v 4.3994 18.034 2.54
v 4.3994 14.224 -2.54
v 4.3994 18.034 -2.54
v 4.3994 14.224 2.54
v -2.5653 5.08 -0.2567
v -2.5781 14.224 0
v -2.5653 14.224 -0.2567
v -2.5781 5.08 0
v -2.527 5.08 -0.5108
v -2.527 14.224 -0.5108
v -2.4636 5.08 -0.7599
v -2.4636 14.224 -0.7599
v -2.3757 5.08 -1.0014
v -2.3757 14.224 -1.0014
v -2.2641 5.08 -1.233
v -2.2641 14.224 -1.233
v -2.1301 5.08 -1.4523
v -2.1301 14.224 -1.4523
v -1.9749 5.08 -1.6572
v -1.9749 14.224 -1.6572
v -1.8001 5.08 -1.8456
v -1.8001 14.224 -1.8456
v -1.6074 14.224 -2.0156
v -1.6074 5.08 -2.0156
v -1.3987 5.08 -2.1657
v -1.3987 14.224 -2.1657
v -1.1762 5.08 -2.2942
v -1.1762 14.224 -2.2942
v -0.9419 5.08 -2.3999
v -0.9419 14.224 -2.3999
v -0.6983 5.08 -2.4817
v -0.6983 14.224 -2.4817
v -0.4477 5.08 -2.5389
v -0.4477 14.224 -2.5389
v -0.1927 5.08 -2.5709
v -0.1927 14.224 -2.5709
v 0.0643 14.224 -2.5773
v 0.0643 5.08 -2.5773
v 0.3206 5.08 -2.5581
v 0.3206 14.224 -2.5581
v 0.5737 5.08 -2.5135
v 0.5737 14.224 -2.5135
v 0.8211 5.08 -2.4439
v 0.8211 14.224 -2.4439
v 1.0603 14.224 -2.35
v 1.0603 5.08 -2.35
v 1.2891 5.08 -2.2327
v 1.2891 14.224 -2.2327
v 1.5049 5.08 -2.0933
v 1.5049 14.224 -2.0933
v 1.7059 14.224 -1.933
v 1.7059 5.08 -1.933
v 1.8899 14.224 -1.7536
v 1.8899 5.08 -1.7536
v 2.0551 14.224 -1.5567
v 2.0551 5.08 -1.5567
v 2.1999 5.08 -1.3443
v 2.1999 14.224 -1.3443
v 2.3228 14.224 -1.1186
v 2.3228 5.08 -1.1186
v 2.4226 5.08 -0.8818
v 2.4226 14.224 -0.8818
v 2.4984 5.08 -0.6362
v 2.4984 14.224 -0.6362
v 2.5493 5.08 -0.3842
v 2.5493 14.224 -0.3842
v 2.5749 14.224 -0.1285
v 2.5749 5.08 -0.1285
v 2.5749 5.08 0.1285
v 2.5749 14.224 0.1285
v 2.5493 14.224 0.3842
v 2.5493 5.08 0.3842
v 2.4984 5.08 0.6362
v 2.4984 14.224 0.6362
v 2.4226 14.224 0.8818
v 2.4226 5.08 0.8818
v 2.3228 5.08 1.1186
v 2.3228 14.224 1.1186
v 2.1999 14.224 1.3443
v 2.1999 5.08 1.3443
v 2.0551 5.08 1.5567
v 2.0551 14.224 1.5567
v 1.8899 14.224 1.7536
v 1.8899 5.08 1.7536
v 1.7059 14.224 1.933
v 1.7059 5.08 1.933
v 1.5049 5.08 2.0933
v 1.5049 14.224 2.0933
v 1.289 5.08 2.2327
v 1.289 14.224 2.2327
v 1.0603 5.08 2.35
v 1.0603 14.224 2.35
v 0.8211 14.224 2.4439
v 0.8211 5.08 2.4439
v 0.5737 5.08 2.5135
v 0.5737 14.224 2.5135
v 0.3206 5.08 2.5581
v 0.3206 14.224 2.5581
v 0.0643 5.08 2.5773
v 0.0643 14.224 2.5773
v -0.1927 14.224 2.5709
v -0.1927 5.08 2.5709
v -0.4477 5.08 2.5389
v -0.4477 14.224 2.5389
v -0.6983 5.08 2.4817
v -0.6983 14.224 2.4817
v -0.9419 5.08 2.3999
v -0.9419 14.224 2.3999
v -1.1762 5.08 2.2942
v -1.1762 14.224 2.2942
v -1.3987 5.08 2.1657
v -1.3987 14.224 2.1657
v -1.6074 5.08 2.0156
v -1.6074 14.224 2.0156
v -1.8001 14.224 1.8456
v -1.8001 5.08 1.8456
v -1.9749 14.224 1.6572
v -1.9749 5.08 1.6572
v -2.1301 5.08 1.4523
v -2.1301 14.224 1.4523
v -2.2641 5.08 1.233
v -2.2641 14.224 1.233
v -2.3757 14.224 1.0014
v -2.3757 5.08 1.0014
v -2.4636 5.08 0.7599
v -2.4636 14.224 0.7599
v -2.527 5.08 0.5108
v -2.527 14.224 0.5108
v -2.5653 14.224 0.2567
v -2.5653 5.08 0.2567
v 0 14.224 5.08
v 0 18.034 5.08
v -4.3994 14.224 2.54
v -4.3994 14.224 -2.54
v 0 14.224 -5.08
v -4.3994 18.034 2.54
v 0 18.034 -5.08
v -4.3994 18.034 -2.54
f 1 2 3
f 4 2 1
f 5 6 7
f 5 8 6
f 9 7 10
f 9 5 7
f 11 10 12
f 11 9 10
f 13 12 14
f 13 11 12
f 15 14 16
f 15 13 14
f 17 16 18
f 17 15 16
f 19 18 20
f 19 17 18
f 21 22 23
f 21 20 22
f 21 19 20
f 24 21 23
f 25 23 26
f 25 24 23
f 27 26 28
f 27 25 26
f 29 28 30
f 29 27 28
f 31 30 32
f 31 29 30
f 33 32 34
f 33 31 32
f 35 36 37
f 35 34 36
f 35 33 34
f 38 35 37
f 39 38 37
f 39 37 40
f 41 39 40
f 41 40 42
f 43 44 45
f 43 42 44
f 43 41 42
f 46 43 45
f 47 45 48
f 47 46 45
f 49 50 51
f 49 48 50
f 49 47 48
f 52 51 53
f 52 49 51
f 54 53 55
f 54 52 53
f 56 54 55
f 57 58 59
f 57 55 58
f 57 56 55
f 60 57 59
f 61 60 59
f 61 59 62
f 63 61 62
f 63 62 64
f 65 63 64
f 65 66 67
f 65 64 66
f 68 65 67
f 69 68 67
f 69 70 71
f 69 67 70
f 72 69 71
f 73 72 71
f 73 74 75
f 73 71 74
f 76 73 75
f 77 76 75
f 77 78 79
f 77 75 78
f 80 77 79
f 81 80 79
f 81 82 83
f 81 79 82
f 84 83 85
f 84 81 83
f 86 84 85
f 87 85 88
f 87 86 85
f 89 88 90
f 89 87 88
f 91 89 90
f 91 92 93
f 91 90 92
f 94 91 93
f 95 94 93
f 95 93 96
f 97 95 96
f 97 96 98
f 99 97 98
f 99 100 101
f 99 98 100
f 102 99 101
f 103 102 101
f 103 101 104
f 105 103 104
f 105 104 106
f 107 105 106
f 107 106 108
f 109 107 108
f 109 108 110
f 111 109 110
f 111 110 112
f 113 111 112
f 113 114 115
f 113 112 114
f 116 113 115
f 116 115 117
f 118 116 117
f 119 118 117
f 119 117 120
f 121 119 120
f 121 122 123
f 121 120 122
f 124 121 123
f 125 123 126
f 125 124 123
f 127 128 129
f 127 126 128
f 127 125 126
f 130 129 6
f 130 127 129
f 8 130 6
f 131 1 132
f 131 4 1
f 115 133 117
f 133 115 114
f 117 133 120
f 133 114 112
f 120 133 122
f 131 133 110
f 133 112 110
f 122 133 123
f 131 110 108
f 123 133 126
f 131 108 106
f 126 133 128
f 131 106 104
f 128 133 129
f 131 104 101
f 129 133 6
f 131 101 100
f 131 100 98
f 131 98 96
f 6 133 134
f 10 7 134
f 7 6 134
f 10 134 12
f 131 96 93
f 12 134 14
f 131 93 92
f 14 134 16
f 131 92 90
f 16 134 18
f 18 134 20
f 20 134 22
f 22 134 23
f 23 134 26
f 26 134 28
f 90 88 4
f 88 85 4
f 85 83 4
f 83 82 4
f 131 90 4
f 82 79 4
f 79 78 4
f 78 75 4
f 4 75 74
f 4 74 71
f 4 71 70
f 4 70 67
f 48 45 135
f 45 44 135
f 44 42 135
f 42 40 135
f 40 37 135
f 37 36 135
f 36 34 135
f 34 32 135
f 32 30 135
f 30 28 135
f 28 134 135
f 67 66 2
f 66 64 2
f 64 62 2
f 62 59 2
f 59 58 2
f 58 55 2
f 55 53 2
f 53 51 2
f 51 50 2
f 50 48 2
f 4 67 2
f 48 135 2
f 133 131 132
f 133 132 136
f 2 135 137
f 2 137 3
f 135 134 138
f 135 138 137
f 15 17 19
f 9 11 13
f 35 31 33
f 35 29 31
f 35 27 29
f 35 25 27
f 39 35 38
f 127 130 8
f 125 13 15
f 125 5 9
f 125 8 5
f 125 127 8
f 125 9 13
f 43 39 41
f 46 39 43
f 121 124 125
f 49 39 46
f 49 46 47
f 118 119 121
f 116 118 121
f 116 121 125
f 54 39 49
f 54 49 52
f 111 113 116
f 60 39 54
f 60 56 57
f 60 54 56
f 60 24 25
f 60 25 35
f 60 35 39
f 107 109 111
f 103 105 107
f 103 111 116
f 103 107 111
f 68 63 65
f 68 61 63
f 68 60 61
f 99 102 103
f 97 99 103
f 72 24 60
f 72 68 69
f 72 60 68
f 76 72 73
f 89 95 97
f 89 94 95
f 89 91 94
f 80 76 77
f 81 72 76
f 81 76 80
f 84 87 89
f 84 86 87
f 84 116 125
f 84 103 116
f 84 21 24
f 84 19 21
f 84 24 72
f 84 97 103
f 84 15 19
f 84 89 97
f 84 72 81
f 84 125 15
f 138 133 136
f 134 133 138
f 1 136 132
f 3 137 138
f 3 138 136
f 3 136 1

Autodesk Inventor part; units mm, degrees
ref_plane "YZ Plane" through (0, 0, 0) normal (1, 0, 0) x (0, 1, 0)
ref_plane "XZ Plane" through (0, 0, 0) normal (0, 1, 0) x (-1, 0, 0)
ref_plane "XY Plane" through (0, 0, 0) normal (0, 0, 1) x (1, 0, 0)
sketch "Sketch1" plane through (0, 0, 0) normal (0, 1, 0) x (-1, 0, 0)
  circle A0 centre (0, 0) radius 2.5781
  dimension "d0" = 5.1562
extrude "Extrusion1" add sketch "Sketch1" along normal blind 14.224
sketch "Sketch2" plane through (0, 14.224, 0) normal (0, 1, 0) x (1, 0, 0)
  line L0 (0, 5.08) -> (4.3994, 2.54)
  line L1 (4.3994, 2.54) -> (4.3994, -2.54)
  line L2 (4.3994, -2.54) -> (0, -5.08)
  line L3 (0, -5.08) -> (-4.3994, -2.54)
  line L4 (-4.3994, -2.54) -> (-4.3994, 2.54)
  line L5 (-4.3994, 2.54) -> (0, 5.08)
  point P0 (0, 0)
  point P1 (0, 0)
  dimension "d3" = 5.08
extrude "Extrusion2" add sketch "Sketch2" along normal blind 3.81
sketch "Sketch3" plane through (0, 0, 0) normal (0, -1, 0) x (1, 0, 0)
  circle A0 centre (0, 0) radius 2.5781
extrude "Extrusion3" cut sketch "Sketch3" against normal blind 5.08
properties part number "Crossbeam to LS Bolt"
